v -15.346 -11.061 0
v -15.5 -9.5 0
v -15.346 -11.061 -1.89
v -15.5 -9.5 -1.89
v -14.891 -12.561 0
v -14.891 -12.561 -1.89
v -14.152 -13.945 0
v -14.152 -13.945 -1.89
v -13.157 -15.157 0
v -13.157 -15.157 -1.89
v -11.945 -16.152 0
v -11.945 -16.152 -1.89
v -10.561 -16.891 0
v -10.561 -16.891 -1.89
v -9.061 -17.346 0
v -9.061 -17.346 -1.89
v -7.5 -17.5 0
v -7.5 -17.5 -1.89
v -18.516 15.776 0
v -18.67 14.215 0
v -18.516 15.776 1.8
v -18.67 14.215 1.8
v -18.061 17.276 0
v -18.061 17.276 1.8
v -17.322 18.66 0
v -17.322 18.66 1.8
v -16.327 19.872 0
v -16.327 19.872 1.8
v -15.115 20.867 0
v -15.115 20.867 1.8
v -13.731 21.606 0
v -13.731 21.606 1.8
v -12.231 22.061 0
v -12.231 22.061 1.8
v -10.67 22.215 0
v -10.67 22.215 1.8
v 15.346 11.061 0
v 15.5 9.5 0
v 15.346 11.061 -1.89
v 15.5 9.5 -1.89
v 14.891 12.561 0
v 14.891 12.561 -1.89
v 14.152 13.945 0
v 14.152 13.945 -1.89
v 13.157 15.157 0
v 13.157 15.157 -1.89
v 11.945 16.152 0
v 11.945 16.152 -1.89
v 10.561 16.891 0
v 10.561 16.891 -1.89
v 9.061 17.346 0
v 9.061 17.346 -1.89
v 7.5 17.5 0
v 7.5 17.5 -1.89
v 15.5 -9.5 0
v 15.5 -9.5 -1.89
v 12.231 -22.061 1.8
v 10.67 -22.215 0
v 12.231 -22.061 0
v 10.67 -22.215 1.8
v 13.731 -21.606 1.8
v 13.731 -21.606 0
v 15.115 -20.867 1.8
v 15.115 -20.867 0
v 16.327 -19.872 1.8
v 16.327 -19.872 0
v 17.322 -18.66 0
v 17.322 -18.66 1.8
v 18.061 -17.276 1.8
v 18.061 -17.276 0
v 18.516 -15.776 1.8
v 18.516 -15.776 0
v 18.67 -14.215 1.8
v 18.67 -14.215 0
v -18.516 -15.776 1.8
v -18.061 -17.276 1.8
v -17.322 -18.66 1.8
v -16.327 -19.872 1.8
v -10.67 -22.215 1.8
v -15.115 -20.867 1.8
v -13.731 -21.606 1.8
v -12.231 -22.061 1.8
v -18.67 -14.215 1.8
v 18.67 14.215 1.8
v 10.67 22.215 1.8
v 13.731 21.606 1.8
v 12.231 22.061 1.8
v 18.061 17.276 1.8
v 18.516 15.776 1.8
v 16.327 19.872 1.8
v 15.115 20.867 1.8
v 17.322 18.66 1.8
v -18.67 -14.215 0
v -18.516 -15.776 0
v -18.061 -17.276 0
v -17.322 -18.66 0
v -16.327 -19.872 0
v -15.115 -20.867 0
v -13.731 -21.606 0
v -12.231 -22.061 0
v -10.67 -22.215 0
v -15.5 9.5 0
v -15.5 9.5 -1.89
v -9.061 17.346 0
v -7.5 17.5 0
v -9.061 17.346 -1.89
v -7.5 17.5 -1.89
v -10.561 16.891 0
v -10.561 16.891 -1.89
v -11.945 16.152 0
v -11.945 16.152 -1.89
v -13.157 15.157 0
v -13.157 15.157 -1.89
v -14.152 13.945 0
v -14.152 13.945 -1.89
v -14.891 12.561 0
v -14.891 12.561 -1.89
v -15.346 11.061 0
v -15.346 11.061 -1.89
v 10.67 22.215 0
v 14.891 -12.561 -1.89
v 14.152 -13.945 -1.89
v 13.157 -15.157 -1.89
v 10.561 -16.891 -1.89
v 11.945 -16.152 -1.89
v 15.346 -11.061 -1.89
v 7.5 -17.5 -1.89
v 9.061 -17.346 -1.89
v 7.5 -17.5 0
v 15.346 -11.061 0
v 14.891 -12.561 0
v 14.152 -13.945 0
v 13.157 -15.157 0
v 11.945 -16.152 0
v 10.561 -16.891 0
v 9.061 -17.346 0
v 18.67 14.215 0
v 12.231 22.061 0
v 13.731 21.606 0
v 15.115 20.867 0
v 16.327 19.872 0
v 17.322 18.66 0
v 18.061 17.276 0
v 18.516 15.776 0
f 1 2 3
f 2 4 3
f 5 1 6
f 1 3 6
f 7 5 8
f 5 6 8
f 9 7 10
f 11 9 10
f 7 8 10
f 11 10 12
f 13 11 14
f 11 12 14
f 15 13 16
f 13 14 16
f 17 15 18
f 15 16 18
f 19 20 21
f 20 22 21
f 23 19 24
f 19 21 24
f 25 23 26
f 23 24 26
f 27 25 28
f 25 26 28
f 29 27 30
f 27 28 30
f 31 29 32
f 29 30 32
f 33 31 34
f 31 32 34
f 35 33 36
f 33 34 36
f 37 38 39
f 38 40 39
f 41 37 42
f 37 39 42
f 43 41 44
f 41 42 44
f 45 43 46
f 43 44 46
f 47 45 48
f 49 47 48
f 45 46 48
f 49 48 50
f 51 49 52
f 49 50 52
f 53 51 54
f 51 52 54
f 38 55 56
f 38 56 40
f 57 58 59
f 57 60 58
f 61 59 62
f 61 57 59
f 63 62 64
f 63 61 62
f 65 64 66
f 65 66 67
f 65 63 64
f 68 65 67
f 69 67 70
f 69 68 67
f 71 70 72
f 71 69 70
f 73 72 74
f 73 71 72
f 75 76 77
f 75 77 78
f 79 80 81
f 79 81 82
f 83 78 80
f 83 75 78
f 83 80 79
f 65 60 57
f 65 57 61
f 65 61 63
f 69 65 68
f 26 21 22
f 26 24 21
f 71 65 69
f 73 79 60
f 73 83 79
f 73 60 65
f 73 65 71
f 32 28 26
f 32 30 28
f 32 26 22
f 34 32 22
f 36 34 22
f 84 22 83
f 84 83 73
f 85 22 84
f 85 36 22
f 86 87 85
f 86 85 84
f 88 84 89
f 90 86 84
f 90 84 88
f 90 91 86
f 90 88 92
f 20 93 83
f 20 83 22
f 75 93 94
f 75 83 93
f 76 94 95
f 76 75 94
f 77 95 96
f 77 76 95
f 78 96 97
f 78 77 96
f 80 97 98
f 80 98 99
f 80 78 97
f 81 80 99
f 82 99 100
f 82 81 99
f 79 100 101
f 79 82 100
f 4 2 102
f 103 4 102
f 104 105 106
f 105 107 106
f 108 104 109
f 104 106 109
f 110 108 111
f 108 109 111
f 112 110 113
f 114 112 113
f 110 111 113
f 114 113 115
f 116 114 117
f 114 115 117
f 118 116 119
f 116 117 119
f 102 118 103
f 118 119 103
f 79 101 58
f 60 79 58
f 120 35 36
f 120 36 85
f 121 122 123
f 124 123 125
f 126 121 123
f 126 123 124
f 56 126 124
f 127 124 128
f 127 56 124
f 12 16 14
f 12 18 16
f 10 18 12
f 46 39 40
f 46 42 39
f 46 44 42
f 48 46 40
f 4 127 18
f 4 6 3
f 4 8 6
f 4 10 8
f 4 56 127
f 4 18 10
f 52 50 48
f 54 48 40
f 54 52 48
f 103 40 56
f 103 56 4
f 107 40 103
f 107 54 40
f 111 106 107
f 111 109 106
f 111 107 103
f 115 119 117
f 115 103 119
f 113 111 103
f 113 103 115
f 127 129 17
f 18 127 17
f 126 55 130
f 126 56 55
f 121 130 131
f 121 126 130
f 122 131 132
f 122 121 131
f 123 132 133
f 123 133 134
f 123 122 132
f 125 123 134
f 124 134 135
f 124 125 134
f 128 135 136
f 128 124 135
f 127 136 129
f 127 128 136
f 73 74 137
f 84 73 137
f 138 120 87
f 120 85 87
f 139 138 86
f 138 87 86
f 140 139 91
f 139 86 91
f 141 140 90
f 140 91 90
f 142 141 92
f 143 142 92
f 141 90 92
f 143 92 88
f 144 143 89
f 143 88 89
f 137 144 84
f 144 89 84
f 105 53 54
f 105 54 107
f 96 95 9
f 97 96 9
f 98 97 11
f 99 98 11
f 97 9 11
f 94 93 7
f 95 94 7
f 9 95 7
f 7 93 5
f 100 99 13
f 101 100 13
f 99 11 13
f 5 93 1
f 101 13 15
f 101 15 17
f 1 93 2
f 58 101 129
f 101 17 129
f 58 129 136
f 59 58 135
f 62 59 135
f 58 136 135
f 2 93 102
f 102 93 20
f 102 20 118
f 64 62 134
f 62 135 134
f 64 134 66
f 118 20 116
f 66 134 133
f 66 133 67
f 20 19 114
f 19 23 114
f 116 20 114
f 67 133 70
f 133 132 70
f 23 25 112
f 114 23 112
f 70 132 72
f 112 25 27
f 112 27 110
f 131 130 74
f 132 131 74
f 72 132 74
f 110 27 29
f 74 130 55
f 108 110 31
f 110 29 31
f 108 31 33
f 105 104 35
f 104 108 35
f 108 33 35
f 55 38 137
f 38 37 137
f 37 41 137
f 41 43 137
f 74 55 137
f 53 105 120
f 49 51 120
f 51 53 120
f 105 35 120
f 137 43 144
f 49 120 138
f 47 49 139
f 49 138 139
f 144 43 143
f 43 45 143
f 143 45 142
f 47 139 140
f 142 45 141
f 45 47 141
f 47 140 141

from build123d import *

# Parameters (mm, degrees)
SKETCH_2_W      = 37.34
SKETCH_2_H      = 44.43
EXTRUDE_1_DEPTH = 1.8
SKETCH_4_W      = 31
SKETCH_4_H      = 35
EXTRUDE_3_DEPTH = 1.89
FILLET_1_R      = 8
FILLET_2_R      = 8


with BuildPart() as part:
    # 草图2 → 凸台-拉伸1 (new body)
    with BuildSketch(Plane.XY):
        Rectangle(SKETCH_2_W, SKETCH_2_H)
    extrude(amount=EXTRUDE_1_DEPTH)

    # 草图4 → 凸台-拉伸3 (add)
    with BuildSketch(Plane(origin=(0, 0, 0), x_dir=(-1, 0, 0), z_dir=(0, 0, -1))):
        Rectangle(SKETCH_4_W, SKETCH_4_H)
    extrude(amount=EXTRUDE_3_DEPTH)

    # 圆角1
    fillet_1_edges = [part.edges().sort_by_distance(p)[0] for p in [
        (18.67, -22.215, 0.9),
        (-18.67, -22.215, 0.9),
        (-18.67, 22.215, 0.9),
        (18.67, 22.215, 0.9),
    ]]
    fillet(fillet_1_edges, radius=FILLET_1_R)

    # 圆角2
    fillet_2_edges = [part.edges().sort_by_distance(p)[0] for p in [
        (15.5, -17.5, -0.945),
        (-15.5, -17.5, -0.945),
        (-15.5, 17.5, -0.945),
        (15.5, 17.5, -0.945),
    ]]
    fillet(fillet_2_edges, radius=FILLET_2_R)


solid = part.part
